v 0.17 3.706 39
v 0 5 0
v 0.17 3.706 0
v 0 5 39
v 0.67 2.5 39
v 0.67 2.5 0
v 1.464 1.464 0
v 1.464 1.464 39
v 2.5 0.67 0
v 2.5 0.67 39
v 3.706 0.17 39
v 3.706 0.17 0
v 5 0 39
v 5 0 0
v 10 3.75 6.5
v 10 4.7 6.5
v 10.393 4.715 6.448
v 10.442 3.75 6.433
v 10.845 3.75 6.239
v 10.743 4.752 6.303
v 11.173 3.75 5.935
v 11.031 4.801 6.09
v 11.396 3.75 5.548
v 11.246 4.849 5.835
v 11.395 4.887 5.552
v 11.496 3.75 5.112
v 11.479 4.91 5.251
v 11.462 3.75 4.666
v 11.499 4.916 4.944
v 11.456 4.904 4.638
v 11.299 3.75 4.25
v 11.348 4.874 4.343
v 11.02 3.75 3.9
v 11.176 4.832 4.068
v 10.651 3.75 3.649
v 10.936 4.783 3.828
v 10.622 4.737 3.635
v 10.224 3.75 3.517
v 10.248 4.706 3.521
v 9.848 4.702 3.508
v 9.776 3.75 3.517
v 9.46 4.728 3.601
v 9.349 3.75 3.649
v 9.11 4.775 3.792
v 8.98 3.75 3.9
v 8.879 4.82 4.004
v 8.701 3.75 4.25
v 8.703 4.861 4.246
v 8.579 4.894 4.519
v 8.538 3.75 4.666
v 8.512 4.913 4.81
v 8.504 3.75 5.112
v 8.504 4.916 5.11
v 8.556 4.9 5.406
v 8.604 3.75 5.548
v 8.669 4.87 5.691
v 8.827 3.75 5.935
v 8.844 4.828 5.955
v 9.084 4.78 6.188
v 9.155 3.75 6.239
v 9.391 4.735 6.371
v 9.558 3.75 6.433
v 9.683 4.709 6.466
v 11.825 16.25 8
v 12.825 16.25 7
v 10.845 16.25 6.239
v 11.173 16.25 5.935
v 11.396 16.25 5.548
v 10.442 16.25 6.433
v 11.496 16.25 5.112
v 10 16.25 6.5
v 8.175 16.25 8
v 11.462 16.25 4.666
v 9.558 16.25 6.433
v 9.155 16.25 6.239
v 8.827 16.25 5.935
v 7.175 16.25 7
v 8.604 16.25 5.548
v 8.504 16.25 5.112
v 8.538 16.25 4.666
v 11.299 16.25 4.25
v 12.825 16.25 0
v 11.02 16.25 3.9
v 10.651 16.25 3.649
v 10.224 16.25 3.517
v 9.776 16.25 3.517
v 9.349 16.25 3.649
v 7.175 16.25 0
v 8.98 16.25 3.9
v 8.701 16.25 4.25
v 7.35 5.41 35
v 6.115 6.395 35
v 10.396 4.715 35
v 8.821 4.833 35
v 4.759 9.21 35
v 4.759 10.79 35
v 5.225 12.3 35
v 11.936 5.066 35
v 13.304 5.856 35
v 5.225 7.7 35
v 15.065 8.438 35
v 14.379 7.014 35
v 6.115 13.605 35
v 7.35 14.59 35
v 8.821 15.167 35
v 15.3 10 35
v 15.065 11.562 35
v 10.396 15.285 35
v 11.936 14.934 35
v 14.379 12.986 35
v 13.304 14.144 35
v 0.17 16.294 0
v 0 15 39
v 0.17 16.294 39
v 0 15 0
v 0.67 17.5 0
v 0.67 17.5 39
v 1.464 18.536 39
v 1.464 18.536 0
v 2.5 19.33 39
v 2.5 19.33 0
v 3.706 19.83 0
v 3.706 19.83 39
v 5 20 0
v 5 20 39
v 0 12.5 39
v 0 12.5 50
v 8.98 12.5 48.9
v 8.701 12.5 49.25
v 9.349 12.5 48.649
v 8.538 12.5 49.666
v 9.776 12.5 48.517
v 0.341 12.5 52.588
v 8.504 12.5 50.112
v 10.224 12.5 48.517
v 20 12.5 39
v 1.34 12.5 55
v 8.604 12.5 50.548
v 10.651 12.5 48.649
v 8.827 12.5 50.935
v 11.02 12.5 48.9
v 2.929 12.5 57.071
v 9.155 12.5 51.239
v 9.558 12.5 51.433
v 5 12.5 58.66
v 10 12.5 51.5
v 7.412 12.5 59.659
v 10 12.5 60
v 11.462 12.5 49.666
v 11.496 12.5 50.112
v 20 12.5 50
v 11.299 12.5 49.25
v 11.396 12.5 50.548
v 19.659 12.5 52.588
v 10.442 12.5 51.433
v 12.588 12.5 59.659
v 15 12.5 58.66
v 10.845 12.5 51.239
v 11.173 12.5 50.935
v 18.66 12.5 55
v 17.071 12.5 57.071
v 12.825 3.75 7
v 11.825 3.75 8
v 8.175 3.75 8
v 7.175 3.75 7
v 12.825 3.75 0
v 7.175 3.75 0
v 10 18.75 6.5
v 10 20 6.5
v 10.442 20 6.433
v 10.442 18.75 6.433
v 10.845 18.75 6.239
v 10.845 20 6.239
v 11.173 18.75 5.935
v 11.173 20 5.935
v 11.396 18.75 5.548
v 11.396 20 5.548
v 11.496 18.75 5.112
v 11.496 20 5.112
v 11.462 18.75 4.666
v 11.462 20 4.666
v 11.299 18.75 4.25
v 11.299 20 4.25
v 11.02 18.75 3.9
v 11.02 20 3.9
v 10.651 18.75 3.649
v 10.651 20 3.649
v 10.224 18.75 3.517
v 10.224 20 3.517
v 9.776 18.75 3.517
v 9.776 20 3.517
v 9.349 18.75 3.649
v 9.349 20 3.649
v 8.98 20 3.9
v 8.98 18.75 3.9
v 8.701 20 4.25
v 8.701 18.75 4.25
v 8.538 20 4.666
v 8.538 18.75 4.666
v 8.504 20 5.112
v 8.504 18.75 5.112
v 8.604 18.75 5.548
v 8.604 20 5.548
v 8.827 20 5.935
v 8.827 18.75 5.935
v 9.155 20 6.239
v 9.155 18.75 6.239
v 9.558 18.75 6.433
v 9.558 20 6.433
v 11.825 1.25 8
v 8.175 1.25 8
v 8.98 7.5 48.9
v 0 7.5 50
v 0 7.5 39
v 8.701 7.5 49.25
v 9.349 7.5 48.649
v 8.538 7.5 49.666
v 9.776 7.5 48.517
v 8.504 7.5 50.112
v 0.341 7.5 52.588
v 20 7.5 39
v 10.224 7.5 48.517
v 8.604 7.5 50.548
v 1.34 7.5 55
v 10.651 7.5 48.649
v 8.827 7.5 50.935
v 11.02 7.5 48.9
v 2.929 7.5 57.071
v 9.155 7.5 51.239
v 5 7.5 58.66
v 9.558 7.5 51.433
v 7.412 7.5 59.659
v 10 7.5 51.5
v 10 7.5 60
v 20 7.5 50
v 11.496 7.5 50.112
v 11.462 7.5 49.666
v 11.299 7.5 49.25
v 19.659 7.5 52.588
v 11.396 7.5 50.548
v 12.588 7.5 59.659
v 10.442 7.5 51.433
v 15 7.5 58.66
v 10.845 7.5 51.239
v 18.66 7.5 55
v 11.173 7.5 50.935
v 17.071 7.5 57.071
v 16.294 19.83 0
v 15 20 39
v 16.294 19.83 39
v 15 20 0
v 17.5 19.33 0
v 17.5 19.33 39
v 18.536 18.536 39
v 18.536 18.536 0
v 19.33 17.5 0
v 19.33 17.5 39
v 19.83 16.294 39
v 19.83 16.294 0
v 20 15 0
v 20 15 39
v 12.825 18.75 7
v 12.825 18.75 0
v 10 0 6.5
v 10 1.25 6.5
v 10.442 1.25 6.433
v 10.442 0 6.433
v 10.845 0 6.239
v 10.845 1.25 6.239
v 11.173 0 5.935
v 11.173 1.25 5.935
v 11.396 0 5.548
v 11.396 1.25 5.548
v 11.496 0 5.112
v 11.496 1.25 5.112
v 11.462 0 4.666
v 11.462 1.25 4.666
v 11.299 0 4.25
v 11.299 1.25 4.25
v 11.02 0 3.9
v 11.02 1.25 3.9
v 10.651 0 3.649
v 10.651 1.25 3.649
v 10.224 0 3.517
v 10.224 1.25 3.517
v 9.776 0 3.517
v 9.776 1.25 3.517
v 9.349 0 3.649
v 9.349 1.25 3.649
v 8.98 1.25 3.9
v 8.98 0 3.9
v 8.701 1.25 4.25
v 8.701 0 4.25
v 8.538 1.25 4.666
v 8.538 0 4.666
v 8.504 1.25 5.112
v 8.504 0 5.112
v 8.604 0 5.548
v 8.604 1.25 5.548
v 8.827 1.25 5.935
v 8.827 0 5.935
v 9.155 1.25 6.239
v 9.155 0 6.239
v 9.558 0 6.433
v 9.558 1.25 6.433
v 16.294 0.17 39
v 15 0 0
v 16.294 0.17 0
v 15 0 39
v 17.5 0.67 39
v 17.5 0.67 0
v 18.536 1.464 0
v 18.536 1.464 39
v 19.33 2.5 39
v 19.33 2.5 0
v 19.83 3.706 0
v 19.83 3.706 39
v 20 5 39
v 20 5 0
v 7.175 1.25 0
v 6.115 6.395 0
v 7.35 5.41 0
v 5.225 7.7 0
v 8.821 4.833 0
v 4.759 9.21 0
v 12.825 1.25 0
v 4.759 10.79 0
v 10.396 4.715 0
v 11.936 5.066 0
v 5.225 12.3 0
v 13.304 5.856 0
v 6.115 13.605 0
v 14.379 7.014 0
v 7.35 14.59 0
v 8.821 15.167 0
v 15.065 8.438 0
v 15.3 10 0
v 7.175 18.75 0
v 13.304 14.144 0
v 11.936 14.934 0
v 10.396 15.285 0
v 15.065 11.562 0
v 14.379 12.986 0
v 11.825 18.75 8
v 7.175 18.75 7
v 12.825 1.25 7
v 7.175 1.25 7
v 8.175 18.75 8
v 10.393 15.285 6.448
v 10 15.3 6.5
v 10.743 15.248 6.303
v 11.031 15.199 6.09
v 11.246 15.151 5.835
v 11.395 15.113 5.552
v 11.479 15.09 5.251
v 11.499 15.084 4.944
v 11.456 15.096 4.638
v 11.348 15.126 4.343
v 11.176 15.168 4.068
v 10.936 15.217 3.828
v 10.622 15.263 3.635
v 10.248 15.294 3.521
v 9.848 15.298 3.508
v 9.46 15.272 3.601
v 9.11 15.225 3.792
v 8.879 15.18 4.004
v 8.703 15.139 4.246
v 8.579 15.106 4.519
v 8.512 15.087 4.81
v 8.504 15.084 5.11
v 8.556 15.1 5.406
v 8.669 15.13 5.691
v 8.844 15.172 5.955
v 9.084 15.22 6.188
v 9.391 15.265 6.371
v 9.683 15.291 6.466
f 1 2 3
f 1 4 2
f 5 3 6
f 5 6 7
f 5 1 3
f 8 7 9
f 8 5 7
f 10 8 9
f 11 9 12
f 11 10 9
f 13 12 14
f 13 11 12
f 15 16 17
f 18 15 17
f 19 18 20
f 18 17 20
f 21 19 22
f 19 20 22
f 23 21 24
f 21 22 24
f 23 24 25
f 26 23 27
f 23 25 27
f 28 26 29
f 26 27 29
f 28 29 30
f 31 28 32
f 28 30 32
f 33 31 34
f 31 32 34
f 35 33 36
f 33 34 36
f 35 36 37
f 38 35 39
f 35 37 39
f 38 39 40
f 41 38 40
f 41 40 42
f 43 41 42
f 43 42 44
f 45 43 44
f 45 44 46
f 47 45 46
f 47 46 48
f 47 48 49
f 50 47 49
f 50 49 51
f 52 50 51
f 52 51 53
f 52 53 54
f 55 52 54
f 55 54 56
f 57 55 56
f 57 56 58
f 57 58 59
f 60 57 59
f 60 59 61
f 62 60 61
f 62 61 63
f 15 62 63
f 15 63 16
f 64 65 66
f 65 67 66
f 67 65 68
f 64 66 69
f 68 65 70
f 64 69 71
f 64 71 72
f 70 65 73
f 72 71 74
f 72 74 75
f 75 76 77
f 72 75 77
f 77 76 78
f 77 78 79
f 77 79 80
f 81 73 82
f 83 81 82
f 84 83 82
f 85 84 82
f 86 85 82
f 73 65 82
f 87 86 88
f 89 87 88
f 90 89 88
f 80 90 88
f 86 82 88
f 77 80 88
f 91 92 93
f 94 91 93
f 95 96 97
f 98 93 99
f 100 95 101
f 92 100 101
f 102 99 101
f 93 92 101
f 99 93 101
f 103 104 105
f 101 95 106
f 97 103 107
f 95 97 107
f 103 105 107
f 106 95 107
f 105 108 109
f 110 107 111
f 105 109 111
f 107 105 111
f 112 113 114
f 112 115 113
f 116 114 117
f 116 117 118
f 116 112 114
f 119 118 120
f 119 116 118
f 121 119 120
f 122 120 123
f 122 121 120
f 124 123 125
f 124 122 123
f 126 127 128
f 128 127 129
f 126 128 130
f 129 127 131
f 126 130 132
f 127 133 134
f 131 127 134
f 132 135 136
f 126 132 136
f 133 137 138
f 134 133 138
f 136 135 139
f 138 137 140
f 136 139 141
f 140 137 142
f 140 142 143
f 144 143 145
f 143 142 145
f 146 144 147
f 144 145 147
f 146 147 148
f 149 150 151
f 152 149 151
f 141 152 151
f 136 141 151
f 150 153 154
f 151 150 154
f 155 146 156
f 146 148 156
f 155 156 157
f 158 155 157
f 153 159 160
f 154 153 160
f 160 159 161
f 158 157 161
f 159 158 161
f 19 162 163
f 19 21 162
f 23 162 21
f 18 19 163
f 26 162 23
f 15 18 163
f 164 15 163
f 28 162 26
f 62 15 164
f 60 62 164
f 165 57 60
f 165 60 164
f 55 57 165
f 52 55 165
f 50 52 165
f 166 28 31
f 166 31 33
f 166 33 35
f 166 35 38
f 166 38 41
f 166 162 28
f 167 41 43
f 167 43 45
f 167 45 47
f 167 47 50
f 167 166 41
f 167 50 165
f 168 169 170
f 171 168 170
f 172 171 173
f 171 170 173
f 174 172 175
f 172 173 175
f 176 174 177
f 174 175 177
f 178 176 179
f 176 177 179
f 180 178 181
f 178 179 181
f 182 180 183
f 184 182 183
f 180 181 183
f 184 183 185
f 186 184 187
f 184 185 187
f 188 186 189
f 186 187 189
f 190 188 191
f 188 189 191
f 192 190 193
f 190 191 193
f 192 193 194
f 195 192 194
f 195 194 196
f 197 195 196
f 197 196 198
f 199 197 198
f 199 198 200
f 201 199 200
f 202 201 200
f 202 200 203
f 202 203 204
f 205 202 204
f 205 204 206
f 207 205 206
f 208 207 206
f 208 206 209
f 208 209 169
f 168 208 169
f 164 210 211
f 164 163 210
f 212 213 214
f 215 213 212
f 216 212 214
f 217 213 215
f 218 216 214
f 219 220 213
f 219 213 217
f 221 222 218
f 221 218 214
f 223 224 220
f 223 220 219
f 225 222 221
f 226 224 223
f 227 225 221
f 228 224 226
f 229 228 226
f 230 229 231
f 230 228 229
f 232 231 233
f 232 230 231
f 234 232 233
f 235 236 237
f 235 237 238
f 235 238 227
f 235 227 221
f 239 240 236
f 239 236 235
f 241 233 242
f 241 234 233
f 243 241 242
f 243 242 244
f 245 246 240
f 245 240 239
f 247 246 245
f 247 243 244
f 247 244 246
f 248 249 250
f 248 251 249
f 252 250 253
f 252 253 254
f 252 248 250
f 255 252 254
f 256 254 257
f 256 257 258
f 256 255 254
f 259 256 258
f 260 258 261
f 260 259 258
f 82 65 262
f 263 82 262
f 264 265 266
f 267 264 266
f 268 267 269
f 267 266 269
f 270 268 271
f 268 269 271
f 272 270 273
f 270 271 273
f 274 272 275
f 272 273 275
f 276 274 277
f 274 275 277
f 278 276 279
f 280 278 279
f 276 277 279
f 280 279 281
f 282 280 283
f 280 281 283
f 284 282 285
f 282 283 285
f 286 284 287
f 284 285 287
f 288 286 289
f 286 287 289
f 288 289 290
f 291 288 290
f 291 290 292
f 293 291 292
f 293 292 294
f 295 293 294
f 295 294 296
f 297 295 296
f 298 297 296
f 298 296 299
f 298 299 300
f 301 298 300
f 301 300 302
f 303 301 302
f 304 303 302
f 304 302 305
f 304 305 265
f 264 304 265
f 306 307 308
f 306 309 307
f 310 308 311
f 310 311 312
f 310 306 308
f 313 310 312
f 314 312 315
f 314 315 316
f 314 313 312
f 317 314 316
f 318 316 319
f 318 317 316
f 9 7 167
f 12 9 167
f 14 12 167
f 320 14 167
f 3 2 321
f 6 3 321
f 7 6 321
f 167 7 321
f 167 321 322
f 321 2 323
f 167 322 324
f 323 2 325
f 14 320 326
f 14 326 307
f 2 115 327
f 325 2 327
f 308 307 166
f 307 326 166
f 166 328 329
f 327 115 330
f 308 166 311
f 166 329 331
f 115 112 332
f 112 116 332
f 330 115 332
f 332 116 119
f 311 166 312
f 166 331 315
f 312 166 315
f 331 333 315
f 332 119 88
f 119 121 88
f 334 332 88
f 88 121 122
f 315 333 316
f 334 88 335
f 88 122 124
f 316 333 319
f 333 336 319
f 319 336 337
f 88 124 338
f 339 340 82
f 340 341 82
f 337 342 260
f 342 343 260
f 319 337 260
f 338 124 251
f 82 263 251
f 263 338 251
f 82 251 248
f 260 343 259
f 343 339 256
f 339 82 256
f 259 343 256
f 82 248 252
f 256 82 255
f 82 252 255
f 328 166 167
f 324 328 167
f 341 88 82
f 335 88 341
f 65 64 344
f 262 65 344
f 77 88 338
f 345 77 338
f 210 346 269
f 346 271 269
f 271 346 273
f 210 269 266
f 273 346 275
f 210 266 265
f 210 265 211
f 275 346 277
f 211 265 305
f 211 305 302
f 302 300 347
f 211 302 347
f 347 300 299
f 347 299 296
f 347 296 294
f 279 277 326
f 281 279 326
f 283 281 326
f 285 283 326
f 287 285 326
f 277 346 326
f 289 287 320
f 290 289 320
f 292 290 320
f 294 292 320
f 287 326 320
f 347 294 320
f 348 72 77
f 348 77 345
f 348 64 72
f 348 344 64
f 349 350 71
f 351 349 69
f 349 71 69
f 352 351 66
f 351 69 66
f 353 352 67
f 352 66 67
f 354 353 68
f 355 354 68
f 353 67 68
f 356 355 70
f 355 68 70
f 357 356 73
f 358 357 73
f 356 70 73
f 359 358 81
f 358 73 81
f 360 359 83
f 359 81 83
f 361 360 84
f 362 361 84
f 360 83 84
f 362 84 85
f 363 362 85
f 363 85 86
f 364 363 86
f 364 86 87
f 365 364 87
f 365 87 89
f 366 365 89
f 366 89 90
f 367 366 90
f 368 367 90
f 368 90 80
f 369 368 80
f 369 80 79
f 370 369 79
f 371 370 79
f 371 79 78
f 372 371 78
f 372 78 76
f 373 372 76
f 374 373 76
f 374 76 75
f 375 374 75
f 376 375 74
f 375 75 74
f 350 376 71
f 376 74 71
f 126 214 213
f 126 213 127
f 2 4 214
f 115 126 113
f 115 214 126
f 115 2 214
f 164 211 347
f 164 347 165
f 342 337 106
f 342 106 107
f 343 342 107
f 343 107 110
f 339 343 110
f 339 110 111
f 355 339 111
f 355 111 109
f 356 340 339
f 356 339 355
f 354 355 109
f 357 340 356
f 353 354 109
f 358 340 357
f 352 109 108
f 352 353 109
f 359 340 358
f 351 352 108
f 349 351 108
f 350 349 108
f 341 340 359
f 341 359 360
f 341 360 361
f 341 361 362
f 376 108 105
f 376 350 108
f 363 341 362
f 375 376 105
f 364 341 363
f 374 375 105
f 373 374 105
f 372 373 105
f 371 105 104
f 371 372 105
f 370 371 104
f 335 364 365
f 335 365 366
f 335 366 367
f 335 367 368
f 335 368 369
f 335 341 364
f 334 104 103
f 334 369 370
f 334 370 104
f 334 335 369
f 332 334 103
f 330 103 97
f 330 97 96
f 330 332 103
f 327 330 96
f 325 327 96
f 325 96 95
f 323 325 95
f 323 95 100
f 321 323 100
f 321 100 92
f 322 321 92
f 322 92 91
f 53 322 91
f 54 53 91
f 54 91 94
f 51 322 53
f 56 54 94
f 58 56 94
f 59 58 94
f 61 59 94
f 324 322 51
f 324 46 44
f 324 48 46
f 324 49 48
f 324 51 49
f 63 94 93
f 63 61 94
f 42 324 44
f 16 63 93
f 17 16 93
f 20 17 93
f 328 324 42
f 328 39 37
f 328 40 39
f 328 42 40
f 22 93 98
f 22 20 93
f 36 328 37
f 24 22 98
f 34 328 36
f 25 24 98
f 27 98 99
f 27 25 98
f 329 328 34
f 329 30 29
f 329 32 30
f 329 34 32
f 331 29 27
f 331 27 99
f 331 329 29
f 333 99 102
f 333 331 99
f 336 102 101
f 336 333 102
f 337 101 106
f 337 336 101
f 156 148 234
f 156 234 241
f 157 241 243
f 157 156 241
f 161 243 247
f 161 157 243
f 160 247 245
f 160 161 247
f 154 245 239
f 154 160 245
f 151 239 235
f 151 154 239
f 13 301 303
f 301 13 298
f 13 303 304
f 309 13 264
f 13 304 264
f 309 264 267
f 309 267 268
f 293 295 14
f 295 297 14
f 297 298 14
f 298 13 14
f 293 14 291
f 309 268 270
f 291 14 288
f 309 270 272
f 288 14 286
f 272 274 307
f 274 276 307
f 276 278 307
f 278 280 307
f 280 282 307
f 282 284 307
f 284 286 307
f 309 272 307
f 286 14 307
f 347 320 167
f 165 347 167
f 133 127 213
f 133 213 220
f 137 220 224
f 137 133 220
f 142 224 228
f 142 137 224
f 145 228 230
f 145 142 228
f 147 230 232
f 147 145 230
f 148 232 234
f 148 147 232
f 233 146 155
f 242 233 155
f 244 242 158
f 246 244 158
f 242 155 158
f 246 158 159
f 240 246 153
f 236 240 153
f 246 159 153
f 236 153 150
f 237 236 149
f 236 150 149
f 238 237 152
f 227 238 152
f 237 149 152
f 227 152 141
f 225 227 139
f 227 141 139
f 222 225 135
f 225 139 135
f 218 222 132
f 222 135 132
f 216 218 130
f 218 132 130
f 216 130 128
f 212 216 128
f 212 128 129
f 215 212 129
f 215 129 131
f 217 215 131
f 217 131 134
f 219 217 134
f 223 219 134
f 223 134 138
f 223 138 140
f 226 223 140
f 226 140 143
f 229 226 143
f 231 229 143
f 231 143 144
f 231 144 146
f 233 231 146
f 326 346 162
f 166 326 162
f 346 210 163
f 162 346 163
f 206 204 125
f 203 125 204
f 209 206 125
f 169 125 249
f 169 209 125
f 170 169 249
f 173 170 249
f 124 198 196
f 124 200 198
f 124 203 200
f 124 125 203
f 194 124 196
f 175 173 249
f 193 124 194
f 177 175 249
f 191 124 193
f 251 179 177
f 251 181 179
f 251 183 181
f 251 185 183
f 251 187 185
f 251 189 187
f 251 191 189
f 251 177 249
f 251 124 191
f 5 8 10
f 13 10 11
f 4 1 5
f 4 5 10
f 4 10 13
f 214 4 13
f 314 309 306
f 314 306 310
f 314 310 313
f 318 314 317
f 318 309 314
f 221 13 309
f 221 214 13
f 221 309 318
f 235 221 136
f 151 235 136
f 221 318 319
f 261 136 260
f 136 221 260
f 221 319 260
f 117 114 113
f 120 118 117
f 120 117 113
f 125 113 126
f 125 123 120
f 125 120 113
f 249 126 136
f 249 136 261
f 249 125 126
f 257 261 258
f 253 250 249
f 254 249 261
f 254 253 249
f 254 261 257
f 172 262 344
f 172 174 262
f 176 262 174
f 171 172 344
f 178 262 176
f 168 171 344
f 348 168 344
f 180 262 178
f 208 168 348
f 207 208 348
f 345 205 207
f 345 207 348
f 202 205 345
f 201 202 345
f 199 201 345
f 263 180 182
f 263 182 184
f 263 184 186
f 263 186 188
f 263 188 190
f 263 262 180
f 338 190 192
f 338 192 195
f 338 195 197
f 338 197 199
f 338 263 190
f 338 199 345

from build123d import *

# Parameters (mm, degrees)
SKETCH1_W           = 20
SKETCH1_H           = 20
SKETCH1_R           = 5.3
BOSS_EXTRUDE1_DEPTH = 35
SKETCH2_W           = 20
SKETCH2_H           = 20
BOSS_EXTRUDE2_DEPTH = 25
CUT_EXTRUDE2_REACH  = 68.332
SKETCH5_R           = 1.5
FILLET2_R           = 10
SKETCH4_W           = 20
SKETCH4_H           = 7.5
CUT_EXTRUDE3_DEPTH  = 21
FILLET3_R           = 5
SKETCH6_W           = 5.65
SKETCH6_H           = 2.5
CUT_EXTRUDE4_DEPTH  = 8
CHAMFER1_SIZE       = 1


with BuildPart() as part:
    # Sketch1 → Boss-Extrude1 (new body)
    with BuildSketch(Plane.XY):
        with Locations((10, 10)):
            Rectangle(SKETCH1_W, SKETCH1_H)
        with Locations((10, 10)):
            Circle(SKETCH1_R, mode=Mode.SUBTRACT)
    extrude(amount=BOSS_EXTRUDE1_DEPTH)

    # Sketch2 → Boss-Extrude2 (add)
    with BuildSketch(Plane.XY.offset(35)):
        with Locations((10, 10)):
            Rectangle(SKETCH2_W, SKETCH2_H)
    extrude(amount=BOSS_EXTRUDE2_DEPTH)

    # Cut-Extrude2: up to this face of the body (flat: up to its plane)
    cut_extrude2_end = Plane(part.part.faces().sort_by_distance((10, 0, 30))[0])
    # Sketch5 → Cut-Extrude2 (cut, up to the picked face)
    with BuildSketch(Plane(origin=(0, 20, 0), x_dir=(1, 0, 0), z_dir=(0, 1, 0)), mode=Mode.PRIVATE) as cut_extrude2_sk1:
        with Locations(Location((10, -5, 0), (0, 0, 270))):
            Circle(SKETCH5_R)
    cut_extrude2_tool1 = split(extrude(cut_extrude2_sk1.sketch, amount=-CUT_EXTRUDE2_REACH, mode=Mode.PRIVATE), bisect_by=cut_extrude2_end, keep=Keep.BOTH, mode=Mode.PRIVATE)
    # Sketch5 → Cut-Extrude2 (cut, up to the picked face)
    with BuildSketch(Plane(origin=(0, 20, 0), x_dir=(1, 0, 0), z_dir=(0, 1, 0)), mode=Mode.PRIVATE) as cut_extrude2_sk2:
        with Locations(Location((10, -50, 0), (0, 0, 270))):
            Circle(SKETCH5_R)
    cut_extrude2_tool2 = split(extrude(cut_extrude2_sk2.sketch, amount=-CUT_EXTRUDE2_REACH, mode=Mode.PRIVATE), bisect_by=cut_extrude2_end, keep=Keep.BOTH, mode=Mode.PRIVATE)
    add(cut_extrude2_tool1.solids().sort_by(Axis((10, 20, 5), (0, -1, 0)))[0], mode=Mode.SUBTRACT)
    add(cut_extrude2_tool2.solids().sort_by(Axis((10, 20, 50), (0, -1, 0)))[0], mode=Mode.SUBTRACT)

    # Fillet2
    fillet2_edges = [part.edges().sort_by_distance(p)[0] for p in [
        (0, 10, 60),
        (20, 10, 60),
    ]]
    fillet(fillet2_edges, radius=FILLET2_R - 0.0001)  # a hair under: the kernel refuses the full size

    # Sketch4 → Cut-Extrude3 (cut)
    with BuildSketch(Plane.XY.offset(60)):
        with Locations((10, 3.75)):
            Rectangle(SKETCH4_W, SKETCH4_H)
        with Locations((10, 16.25)):
            Rectangle(SKETCH4_W, SKETCH4_H)
    extrude(amount=-CUT_EXTRUDE3_DEPTH, mode=Mode.SUBTRACT)

    # Fillet3
    fillet3_edges = [part.edges().sort_by_distance(p)[0] for p in [
        (0, 20, 19.5),
        (20, 20, 19.5),
        (20, 0, 19.5),
        (0, 0, 19.5),
    ]]
    fillet(fillet3_edges, radius=FILLET3_R)

    # Sketch6 → Cut-Extrude4 (cut)
    with BuildSketch(Plane(origin=(0, 0, 0), x_dir=(-1, 0, 0), z_dir=(0, 0, -1))):
        with Locations((-10, 17.5)):
            Rectangle(SKETCH6_W, SKETCH6_H)
        with Locations((-10, 2.5)):
            Rectangle(SKETCH6_W, SKETCH6_H)
    extrude(amount=-CUT_EXTRUDE4_DEPTH, mode=Mode.SUBTRACT)

    # Chamfer1
    chamfer1_edges = [part.edges().sort_by_distance(p)[0] for p in [
        (12.825, 17.5, 8),
        (7.175, 17.5, 8),
        (12.825, 2.5, 8),
        (7.175, 2.5, 8),
    ]]
    chamfer(chamfer1_edges, length=CHAMFER1_SIZE)


solid = part.part
